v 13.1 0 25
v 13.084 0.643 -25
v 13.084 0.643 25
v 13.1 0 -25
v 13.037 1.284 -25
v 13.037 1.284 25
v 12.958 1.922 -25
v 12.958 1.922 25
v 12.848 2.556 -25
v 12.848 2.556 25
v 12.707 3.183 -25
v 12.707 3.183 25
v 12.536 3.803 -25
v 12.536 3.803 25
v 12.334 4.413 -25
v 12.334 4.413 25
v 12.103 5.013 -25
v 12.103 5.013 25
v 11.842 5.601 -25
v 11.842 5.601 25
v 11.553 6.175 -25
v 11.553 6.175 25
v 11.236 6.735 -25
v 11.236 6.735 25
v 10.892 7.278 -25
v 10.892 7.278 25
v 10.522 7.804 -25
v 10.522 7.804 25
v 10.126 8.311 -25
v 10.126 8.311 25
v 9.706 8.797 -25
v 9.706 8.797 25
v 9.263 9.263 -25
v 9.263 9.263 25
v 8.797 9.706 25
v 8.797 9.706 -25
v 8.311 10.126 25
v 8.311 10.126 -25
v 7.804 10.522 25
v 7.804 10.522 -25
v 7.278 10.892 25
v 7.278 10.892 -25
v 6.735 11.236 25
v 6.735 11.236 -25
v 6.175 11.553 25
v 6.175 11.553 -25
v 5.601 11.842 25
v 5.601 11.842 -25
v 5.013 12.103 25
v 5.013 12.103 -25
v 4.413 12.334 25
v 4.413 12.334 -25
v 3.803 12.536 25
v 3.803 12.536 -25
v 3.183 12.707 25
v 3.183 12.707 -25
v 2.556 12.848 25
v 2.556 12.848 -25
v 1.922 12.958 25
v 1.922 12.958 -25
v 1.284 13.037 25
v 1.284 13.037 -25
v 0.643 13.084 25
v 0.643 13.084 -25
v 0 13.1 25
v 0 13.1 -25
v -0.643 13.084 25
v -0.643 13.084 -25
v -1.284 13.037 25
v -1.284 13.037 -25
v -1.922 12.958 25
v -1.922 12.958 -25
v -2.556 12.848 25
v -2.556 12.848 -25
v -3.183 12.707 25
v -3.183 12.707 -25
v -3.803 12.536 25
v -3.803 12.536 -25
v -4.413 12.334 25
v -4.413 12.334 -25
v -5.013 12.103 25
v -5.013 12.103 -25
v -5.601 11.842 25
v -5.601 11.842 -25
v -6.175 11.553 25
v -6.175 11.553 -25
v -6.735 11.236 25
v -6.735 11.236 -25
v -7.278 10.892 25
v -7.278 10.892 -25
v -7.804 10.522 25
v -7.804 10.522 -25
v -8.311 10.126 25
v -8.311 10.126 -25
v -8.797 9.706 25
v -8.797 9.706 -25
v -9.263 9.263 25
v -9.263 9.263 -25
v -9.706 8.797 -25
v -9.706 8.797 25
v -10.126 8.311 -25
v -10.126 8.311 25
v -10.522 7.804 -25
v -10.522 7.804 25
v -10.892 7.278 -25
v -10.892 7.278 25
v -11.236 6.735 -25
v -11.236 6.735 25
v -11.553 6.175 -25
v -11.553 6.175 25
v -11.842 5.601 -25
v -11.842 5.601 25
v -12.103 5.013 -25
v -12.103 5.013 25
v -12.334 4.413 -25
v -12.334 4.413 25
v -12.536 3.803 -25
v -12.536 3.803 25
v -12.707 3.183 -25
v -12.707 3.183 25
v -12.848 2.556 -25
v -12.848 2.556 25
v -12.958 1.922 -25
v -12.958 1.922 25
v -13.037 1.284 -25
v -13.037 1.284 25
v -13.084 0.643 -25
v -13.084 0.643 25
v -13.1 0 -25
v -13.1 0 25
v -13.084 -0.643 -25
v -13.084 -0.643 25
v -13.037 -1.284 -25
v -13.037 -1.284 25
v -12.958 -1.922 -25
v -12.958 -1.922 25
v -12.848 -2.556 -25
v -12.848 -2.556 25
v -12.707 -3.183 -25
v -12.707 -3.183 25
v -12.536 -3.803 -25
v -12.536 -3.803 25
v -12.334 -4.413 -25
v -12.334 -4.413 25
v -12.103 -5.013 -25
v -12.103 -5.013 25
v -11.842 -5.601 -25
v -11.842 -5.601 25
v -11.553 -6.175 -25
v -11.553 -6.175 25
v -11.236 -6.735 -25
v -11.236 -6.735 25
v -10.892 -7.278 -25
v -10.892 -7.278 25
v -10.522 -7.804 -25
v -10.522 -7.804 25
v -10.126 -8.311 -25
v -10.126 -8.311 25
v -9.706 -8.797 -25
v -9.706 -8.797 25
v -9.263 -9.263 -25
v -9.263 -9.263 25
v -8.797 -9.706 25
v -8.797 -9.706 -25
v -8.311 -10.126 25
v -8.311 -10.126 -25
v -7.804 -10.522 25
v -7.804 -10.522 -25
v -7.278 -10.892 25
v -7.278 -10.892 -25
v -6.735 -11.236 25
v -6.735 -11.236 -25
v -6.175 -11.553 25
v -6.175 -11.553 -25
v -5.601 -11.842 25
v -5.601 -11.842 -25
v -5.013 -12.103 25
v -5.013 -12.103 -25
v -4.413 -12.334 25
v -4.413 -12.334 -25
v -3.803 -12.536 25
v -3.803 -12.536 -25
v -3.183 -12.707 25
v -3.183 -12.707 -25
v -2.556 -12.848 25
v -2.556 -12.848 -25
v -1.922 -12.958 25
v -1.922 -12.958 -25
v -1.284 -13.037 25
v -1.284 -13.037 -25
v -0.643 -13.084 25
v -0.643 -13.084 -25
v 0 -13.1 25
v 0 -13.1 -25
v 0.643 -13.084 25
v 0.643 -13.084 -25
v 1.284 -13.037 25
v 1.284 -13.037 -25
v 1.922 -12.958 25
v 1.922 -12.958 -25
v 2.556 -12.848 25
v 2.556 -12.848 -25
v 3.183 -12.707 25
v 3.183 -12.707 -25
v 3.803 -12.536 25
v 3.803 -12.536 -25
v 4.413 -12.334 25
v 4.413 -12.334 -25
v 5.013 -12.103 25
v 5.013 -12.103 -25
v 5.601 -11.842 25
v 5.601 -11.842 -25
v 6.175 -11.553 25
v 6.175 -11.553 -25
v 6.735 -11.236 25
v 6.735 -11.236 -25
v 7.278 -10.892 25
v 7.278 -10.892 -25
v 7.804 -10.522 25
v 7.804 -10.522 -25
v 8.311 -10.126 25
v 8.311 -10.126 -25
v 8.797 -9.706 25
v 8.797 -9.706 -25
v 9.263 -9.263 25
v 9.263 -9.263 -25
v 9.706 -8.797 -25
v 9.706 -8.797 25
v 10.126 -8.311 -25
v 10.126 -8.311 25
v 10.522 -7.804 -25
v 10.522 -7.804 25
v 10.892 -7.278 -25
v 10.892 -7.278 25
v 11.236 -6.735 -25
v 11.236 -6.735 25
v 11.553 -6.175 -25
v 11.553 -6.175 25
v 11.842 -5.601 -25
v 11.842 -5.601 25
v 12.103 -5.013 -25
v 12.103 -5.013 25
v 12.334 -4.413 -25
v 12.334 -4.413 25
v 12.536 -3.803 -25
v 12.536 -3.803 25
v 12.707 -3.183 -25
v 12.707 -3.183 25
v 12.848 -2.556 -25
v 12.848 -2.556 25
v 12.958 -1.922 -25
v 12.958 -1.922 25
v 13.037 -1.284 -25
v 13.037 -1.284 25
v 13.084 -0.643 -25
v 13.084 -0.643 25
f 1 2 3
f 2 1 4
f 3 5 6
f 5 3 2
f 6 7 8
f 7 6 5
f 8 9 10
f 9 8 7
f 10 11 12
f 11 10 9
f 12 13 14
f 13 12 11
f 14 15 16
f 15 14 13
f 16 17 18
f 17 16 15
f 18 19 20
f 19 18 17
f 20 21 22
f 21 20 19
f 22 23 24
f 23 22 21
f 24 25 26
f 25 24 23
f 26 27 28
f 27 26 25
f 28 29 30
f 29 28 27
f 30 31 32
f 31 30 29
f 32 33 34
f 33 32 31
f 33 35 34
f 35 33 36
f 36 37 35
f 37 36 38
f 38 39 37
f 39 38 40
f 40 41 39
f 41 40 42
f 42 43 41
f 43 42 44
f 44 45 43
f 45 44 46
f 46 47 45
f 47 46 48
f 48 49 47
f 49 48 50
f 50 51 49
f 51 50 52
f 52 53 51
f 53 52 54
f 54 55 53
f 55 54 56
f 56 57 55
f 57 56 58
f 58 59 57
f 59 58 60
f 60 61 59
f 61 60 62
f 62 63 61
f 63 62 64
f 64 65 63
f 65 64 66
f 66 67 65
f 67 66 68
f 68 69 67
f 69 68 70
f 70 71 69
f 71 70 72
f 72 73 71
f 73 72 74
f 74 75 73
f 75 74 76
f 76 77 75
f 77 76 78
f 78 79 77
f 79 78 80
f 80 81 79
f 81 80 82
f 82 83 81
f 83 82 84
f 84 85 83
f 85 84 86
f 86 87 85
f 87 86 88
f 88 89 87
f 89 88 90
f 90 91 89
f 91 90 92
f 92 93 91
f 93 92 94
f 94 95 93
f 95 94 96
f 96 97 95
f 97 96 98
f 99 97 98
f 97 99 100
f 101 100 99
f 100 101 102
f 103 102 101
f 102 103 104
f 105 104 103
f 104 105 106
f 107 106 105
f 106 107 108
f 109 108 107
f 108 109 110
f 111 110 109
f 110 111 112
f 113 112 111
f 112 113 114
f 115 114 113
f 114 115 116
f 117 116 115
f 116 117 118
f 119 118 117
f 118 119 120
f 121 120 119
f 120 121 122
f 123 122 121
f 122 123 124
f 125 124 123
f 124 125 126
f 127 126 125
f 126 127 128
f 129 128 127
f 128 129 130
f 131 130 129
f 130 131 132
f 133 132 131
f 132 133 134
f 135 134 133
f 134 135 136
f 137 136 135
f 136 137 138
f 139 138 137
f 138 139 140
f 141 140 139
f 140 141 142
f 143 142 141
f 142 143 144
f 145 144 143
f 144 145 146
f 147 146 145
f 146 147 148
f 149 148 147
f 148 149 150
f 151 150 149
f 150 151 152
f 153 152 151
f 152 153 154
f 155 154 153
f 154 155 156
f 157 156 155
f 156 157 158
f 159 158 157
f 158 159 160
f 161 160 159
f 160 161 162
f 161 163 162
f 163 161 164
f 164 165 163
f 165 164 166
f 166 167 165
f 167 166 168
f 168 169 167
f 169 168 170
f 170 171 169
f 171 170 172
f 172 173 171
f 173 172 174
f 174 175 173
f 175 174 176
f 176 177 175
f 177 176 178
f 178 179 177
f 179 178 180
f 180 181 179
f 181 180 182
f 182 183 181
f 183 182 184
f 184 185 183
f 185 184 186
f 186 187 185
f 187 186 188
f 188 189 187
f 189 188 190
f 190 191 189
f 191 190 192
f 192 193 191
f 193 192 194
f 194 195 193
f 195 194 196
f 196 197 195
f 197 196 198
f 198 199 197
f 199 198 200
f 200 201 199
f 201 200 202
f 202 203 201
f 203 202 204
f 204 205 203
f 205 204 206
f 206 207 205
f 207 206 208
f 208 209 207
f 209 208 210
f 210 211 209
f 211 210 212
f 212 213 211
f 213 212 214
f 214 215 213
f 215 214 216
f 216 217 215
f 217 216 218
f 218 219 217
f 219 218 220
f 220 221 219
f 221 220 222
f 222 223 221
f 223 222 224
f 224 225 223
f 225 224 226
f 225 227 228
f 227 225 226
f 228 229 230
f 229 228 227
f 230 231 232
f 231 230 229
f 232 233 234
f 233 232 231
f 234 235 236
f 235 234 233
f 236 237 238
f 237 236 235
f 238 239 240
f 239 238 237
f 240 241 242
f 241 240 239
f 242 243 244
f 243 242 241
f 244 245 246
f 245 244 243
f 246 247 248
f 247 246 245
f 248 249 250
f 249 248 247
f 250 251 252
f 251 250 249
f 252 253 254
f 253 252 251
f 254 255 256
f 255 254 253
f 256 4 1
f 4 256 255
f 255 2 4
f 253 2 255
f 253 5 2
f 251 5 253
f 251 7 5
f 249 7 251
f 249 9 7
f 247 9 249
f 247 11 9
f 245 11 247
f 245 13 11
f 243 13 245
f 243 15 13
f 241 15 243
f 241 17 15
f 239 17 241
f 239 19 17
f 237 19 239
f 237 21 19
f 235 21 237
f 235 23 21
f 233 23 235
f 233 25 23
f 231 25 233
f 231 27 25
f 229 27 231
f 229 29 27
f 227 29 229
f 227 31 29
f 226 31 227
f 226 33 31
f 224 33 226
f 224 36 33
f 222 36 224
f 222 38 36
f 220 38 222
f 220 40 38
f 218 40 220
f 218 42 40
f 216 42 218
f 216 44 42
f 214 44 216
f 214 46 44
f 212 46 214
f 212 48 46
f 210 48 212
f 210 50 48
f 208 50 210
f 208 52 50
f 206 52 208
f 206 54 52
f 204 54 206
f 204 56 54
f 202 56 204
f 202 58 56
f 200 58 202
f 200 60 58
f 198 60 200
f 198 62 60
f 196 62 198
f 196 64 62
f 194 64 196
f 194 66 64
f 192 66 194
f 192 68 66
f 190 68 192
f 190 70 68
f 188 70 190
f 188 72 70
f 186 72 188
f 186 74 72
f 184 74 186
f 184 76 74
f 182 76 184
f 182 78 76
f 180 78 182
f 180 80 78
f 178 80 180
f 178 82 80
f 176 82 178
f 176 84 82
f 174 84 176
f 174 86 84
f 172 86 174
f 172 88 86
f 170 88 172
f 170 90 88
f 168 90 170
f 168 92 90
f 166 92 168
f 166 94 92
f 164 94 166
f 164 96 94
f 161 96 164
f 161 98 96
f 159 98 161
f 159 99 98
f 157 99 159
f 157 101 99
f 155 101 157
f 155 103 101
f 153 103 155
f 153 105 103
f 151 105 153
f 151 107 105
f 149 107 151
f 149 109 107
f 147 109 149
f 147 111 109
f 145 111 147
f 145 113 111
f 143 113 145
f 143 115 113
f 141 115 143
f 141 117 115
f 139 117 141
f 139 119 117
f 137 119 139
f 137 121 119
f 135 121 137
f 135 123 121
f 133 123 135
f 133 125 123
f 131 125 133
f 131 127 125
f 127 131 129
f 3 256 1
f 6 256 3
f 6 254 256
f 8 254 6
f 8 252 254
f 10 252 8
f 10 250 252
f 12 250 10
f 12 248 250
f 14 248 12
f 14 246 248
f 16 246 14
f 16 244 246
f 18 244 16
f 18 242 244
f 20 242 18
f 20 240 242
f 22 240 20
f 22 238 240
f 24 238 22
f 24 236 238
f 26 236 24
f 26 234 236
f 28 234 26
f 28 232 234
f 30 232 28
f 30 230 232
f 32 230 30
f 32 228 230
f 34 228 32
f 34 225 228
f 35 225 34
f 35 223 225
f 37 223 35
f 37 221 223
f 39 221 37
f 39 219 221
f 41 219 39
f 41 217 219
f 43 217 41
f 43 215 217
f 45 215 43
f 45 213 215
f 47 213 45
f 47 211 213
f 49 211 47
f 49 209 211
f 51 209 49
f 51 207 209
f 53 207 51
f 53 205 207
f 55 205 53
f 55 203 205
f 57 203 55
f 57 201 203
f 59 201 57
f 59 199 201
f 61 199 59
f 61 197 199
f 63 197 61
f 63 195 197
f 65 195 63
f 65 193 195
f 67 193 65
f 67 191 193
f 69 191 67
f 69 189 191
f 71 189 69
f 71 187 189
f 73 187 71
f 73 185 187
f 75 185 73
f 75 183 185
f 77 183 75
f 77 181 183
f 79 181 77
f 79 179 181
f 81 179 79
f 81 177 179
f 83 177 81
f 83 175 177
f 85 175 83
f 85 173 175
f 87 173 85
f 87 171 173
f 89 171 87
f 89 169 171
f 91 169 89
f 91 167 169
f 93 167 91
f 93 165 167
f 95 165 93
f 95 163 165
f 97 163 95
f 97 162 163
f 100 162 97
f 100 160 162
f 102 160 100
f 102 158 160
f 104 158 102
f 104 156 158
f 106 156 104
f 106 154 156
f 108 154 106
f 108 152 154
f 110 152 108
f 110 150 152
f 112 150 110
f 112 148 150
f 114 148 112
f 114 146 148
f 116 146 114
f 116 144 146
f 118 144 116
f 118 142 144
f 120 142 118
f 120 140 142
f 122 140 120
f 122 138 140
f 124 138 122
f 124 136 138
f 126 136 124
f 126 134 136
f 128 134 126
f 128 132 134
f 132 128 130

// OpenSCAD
$fn=128;

cell_h = 50.0;
cell_d = 26.2;

module battery_cell(h=cell_h, d=cell_d) {
    cylinder(h=h, d=d, center=true);
}

battery_cell();
